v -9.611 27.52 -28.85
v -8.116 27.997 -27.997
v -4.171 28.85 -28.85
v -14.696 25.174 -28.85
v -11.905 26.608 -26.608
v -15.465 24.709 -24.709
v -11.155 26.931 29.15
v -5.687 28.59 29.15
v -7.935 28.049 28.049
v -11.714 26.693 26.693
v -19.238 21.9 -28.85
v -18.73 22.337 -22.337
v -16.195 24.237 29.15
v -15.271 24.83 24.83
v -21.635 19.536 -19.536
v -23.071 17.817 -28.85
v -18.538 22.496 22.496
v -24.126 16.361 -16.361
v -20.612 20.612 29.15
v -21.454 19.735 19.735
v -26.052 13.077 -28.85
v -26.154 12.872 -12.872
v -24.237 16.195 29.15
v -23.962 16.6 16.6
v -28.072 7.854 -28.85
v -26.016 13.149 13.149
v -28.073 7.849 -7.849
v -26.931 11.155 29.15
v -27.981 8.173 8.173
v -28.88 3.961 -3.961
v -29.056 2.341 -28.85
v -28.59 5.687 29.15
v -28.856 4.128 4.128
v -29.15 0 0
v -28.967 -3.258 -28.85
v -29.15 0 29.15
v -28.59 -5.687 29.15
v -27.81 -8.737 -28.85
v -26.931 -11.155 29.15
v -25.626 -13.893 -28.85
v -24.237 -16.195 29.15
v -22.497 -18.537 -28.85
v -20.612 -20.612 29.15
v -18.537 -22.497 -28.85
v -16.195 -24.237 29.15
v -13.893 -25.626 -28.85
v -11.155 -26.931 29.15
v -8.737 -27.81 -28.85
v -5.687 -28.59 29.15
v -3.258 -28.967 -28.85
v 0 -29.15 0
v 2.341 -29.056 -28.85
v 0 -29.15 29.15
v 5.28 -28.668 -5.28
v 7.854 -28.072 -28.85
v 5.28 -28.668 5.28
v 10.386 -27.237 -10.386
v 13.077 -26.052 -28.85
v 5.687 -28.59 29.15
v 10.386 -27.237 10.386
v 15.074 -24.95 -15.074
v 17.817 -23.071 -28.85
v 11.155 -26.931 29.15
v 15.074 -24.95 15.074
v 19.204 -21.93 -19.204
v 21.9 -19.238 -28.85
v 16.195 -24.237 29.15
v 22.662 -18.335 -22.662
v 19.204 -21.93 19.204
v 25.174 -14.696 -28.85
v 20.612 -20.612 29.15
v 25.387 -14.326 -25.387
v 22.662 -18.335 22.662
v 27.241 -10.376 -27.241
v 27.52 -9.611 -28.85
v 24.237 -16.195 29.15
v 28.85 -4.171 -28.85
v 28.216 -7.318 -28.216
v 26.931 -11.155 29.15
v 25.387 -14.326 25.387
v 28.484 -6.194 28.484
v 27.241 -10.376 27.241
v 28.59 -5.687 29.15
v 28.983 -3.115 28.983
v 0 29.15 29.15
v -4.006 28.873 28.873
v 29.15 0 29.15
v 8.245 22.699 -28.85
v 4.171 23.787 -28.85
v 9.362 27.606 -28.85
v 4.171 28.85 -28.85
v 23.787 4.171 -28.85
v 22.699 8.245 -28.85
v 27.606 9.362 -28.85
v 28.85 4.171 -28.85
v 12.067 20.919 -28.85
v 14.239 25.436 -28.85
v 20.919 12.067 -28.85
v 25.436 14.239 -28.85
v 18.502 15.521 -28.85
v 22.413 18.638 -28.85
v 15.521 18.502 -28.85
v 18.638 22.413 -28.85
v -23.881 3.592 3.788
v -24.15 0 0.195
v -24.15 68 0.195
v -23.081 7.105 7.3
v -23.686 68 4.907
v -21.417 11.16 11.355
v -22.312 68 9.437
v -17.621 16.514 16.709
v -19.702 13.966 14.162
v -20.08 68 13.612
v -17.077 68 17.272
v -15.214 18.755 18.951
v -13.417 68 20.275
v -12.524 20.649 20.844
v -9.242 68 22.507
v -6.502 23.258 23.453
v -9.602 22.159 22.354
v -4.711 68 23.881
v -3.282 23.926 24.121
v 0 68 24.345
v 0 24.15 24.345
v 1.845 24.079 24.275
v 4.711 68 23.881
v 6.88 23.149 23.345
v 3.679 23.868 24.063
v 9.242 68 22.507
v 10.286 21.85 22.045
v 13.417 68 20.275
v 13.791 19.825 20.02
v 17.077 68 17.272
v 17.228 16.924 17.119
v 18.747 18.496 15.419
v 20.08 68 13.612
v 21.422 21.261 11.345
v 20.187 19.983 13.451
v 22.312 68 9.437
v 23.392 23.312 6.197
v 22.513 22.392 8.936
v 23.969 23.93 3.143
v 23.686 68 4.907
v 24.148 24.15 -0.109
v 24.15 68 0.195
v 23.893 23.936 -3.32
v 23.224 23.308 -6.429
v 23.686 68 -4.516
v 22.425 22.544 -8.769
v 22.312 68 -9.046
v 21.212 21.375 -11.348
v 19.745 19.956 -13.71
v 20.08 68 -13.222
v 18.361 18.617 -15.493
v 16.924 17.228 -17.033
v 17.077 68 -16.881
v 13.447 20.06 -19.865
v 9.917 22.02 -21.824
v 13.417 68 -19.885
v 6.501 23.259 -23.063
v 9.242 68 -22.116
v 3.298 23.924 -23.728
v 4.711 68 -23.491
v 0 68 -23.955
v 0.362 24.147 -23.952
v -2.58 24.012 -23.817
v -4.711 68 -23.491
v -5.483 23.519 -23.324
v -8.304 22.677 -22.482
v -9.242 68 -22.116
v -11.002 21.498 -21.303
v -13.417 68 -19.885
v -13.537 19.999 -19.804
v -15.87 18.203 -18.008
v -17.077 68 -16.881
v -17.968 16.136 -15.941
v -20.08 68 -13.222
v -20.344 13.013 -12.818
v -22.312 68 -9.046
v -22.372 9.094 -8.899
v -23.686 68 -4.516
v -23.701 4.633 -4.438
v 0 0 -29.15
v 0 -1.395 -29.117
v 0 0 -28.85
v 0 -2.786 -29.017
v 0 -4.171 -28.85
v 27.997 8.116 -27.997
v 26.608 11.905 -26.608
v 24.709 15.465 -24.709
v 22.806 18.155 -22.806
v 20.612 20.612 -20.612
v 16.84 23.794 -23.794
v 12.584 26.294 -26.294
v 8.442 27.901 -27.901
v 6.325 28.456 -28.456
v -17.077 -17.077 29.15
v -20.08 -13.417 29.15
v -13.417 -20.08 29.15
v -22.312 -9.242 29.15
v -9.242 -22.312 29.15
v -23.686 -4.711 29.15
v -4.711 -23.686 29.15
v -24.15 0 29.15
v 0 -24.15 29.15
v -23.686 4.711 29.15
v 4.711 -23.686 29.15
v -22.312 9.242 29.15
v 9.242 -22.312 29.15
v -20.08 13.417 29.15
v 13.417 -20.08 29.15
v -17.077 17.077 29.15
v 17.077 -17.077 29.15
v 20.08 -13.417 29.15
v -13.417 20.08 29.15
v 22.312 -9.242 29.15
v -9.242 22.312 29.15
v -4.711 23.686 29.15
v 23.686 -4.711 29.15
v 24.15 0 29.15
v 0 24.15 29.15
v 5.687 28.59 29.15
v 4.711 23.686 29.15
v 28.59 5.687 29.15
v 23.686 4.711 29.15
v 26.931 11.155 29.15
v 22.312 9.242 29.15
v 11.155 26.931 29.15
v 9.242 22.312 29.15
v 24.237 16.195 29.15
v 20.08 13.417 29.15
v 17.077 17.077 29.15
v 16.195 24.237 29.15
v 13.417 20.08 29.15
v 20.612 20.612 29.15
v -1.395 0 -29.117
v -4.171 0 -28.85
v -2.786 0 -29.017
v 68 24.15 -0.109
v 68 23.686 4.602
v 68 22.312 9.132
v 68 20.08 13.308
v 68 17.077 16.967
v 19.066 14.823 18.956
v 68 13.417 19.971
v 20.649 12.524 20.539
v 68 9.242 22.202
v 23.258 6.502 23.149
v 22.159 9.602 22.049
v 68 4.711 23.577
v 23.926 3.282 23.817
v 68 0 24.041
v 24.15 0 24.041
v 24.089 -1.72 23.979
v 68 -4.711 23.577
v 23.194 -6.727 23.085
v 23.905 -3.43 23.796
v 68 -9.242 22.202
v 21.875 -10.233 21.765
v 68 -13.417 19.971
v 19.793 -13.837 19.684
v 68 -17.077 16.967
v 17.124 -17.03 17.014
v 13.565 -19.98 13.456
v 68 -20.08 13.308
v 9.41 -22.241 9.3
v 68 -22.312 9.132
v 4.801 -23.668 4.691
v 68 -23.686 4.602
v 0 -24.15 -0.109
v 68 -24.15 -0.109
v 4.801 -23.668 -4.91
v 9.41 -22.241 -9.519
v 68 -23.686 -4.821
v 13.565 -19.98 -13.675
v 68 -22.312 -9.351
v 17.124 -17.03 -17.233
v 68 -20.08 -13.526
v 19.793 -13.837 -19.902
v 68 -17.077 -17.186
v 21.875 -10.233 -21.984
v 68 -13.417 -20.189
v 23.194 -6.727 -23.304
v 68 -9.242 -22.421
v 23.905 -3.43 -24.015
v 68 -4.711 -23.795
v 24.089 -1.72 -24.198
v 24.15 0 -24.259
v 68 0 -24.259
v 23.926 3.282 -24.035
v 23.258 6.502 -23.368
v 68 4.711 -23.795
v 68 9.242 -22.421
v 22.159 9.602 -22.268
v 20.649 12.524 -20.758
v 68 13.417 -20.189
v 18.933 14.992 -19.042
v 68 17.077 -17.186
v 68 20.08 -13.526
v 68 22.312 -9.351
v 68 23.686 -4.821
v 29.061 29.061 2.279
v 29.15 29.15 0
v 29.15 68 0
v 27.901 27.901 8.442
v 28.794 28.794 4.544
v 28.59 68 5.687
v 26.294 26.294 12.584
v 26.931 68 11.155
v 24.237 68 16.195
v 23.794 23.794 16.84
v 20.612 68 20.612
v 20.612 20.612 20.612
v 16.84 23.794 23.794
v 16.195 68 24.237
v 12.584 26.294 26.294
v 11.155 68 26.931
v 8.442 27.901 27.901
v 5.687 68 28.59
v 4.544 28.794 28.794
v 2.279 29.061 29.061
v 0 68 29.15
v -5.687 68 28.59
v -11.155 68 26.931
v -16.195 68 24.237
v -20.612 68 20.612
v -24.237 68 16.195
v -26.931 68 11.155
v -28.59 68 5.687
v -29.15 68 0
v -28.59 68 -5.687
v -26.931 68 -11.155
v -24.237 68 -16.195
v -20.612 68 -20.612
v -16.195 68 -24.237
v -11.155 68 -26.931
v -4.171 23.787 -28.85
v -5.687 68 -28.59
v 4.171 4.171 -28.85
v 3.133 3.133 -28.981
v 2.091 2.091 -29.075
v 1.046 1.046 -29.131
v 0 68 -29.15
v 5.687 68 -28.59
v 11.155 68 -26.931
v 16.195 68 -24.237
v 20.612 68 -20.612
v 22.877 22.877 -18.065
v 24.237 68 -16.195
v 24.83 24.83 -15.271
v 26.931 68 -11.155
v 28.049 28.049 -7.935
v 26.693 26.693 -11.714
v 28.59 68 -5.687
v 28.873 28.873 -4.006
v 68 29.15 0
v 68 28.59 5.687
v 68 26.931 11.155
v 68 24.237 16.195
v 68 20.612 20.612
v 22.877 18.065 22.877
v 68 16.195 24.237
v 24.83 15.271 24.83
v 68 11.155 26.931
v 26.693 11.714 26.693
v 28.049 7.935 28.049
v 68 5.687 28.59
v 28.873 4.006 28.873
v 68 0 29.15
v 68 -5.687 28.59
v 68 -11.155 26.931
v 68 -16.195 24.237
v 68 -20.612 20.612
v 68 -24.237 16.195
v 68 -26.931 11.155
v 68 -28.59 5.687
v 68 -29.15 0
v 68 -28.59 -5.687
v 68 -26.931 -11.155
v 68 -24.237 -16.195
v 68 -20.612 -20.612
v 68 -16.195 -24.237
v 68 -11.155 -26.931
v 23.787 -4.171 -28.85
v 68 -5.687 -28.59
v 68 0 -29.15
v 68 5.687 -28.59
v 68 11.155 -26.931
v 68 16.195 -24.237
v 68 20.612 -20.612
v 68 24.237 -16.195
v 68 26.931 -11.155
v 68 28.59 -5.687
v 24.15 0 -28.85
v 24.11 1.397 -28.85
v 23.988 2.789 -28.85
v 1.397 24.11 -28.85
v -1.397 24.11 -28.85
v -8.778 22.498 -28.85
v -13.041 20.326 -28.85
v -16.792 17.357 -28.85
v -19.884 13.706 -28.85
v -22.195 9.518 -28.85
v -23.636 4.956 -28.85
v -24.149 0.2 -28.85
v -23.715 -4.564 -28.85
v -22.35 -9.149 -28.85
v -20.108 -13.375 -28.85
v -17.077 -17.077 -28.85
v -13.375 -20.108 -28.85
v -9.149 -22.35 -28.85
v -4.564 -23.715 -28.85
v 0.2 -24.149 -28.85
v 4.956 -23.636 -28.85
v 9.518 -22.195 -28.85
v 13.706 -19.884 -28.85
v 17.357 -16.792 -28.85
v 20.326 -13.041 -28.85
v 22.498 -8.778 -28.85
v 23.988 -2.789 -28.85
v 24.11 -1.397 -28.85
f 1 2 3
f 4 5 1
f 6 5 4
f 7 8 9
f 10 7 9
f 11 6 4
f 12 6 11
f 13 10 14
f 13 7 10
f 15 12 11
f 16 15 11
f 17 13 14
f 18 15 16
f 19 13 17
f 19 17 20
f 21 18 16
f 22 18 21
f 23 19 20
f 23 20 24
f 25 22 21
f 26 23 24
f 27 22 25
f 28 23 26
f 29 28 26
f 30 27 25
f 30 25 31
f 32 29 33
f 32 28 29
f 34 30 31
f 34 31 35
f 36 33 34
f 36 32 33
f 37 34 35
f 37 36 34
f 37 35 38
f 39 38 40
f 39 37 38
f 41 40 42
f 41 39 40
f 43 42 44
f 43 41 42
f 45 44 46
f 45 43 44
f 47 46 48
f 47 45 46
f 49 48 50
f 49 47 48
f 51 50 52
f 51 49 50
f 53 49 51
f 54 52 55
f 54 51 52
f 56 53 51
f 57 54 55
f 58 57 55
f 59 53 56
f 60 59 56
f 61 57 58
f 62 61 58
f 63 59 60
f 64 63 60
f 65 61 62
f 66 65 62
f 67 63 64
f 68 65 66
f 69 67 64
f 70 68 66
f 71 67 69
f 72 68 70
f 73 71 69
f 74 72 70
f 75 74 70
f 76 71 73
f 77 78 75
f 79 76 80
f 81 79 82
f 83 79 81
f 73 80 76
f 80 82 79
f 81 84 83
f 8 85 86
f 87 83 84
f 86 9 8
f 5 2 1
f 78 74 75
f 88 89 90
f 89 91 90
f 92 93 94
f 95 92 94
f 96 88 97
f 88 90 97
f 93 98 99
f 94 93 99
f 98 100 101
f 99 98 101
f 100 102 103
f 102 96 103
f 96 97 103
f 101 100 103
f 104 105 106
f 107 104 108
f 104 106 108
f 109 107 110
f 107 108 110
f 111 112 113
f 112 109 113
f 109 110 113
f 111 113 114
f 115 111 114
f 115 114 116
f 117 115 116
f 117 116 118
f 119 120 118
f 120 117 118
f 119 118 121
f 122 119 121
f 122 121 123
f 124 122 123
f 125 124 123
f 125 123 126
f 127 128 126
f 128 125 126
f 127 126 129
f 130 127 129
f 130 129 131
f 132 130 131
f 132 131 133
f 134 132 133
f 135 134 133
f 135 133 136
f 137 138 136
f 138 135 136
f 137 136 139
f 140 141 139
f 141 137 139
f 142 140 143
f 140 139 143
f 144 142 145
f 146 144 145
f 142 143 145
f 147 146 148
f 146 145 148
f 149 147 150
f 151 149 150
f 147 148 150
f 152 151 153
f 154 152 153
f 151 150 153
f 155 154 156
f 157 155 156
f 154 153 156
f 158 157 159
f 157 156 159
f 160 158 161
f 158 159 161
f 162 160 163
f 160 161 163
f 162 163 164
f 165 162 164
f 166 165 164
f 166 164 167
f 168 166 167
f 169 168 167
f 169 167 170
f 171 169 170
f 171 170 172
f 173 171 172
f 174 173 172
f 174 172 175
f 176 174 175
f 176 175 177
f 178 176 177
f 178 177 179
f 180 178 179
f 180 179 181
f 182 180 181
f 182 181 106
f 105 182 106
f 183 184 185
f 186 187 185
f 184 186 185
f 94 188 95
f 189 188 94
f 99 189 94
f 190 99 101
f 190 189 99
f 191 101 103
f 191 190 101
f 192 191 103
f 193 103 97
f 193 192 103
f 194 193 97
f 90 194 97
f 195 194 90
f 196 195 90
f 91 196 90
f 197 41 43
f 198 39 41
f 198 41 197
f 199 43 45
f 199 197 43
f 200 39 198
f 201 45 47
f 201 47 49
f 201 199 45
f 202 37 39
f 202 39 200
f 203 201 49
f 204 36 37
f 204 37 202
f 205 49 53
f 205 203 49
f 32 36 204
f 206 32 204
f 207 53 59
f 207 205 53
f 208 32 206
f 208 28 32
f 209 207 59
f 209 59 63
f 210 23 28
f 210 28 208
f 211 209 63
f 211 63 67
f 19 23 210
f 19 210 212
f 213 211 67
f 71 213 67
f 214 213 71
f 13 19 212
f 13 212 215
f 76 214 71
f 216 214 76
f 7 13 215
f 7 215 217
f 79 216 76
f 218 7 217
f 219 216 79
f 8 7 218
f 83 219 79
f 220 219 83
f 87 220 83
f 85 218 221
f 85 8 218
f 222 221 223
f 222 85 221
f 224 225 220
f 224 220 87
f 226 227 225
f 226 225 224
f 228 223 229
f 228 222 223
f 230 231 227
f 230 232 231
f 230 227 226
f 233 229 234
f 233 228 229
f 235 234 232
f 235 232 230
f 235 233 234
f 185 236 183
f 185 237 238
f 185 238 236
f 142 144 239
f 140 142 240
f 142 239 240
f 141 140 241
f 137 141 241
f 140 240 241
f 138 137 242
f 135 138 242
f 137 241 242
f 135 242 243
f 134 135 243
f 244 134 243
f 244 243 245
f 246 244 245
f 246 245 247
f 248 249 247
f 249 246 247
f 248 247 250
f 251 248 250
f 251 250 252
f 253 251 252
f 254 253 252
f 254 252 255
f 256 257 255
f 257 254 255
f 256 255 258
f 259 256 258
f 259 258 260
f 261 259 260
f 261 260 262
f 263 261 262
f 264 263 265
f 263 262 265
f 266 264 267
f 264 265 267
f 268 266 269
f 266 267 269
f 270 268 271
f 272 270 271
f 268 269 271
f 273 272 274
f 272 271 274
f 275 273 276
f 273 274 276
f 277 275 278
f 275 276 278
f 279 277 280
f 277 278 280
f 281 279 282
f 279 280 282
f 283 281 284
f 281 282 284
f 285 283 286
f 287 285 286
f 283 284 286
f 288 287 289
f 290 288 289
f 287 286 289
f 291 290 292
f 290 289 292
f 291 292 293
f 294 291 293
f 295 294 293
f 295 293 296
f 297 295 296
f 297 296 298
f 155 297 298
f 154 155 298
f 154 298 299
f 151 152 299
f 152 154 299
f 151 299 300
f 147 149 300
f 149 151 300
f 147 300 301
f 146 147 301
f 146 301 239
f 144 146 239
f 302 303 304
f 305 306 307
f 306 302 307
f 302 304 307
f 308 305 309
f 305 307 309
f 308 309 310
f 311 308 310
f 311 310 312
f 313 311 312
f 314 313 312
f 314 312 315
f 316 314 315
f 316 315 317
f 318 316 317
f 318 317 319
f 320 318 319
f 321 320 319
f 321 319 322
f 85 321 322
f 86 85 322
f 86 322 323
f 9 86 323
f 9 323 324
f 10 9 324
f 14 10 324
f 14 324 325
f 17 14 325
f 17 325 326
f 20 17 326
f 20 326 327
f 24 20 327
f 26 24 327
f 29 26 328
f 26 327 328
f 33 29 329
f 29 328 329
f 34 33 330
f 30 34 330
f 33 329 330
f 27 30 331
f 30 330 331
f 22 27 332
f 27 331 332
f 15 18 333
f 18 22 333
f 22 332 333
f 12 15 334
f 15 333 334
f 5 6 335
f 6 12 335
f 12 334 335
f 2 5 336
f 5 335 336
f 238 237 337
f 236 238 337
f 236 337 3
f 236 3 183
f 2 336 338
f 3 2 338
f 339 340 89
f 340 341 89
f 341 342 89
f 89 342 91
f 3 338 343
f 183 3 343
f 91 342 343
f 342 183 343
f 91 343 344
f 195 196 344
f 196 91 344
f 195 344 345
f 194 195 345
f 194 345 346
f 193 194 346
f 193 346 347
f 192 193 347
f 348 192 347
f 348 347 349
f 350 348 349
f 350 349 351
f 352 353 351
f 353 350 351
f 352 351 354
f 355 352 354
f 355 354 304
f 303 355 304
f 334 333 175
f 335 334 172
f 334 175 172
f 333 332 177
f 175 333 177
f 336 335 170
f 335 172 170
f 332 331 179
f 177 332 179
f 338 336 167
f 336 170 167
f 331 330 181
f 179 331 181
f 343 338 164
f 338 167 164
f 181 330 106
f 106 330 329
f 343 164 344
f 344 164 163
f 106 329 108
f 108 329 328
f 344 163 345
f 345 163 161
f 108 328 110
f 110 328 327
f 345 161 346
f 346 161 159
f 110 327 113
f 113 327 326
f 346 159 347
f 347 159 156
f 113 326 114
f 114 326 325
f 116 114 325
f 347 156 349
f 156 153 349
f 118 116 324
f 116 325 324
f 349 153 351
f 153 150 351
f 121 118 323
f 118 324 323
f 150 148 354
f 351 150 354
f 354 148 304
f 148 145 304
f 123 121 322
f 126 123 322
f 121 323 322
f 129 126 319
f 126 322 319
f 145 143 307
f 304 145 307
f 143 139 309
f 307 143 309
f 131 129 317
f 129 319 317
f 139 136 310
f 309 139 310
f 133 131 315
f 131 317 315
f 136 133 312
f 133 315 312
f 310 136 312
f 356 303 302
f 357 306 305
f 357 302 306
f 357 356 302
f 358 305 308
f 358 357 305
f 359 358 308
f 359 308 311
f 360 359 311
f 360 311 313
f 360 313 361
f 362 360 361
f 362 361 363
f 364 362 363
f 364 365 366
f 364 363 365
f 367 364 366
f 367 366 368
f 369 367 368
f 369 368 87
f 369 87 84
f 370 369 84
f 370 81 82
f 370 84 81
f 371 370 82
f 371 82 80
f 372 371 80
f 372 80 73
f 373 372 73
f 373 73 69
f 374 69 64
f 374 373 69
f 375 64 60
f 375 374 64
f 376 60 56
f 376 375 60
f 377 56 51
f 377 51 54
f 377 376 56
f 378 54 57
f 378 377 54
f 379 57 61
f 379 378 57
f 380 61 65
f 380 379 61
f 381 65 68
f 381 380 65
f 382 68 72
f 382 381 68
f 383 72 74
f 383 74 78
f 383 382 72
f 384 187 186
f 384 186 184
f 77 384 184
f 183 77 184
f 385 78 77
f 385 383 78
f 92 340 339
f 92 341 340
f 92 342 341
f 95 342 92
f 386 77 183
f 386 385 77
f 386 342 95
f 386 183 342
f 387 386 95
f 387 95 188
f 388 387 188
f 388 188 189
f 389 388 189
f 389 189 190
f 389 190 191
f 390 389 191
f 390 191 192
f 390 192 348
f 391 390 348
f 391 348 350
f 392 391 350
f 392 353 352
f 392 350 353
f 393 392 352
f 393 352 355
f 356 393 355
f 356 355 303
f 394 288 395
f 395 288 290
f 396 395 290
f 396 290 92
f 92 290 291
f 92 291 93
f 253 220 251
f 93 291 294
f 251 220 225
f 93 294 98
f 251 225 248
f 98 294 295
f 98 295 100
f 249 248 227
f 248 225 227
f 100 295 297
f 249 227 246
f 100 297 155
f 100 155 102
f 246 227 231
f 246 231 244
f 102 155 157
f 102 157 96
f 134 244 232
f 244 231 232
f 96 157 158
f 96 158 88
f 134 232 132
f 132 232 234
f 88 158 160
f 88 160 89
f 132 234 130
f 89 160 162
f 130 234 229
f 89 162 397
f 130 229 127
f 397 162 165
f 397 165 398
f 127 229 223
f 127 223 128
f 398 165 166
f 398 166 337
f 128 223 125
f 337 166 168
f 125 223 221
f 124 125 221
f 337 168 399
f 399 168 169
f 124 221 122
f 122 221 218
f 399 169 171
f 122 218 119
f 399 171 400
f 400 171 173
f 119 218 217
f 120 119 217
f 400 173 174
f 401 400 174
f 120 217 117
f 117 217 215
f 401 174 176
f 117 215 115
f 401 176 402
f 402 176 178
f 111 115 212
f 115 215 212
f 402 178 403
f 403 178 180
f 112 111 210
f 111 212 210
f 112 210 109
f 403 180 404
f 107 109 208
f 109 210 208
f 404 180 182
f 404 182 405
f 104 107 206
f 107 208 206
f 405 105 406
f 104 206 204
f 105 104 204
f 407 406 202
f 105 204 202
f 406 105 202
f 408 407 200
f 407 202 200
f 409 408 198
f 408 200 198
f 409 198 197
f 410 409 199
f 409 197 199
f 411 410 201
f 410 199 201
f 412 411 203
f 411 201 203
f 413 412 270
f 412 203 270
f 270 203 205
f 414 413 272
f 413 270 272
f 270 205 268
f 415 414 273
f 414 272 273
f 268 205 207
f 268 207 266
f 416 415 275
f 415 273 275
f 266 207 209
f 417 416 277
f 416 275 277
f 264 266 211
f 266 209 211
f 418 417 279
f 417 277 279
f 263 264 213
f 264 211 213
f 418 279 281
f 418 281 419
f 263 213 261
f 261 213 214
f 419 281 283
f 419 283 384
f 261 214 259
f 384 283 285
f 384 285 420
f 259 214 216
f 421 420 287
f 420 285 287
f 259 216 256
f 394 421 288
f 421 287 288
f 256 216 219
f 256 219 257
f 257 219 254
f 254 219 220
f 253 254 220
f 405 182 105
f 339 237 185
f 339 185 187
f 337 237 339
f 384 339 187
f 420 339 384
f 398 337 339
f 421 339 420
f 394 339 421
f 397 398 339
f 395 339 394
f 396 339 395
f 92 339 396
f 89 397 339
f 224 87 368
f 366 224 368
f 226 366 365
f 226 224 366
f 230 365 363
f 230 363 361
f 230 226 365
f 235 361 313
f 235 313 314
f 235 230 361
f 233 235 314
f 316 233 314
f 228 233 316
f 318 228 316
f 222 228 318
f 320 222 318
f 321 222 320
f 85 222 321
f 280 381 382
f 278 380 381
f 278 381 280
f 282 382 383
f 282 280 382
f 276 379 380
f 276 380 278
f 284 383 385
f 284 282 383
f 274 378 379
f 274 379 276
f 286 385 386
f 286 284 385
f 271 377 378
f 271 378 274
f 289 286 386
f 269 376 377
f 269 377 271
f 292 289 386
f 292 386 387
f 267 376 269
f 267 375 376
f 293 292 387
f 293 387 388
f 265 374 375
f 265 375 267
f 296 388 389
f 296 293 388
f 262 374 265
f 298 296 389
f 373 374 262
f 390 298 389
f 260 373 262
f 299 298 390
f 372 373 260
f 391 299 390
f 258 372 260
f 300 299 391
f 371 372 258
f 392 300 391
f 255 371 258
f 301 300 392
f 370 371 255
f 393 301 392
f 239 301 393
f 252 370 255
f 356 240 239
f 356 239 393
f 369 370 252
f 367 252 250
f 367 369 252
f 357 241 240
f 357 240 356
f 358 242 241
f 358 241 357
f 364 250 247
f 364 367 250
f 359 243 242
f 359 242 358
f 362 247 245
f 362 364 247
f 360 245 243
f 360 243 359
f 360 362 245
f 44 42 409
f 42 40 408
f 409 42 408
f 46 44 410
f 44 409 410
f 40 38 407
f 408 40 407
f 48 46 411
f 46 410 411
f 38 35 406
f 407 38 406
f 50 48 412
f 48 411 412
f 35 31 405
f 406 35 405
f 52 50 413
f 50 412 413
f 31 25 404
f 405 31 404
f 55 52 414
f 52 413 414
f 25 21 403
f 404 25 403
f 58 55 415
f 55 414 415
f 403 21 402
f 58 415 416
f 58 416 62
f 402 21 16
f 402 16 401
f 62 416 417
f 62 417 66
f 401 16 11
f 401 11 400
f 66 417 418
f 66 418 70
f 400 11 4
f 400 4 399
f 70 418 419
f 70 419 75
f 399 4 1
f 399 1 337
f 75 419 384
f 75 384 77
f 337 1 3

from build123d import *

# Parameters (mm, degrees)
SKETCH_R        = 29.15
PAD_DEPTH       = 58
SKETCH001_R     = 29.15
PAD001_DEPTH    = 68
SKETCH002_R     = 29.15
PAD002_DEPTH    = 68
SKETCH003_R     = 24.15
POCKET_DEPTH    = 58
SKETCH004_R     = 24.15
POCKET001_DEPTH = 68
SKETCH005_R     = 24.15
POCKET002_DEPTH = 68


with BuildPart() as part:
    # Sketch → Pad (new body)
    with BuildSketch(Plane.XY.offset(29.15)):
        Circle(SKETCH_R)
    extrude(amount=-PAD_DEPTH)

    # Sketch001 → Pad001 (join)
    with BuildSketch(Plane.XZ.offset(-68)):
        Circle(SKETCH001_R)
    extrude(amount=PAD001_DEPTH)

    # Sketch002 → Pad002 (join)
    with BuildSketch(Plane.YZ.offset(68)):
        Circle(SKETCH002_R)
    extrude(amount=-PAD002_DEPTH)

    # Sketch003 (on Face5 of Pad002) → Pocket (cut)
    with BuildSketch(Plane.XY.offset(29.15)):
        Circle(SKETCH003_R)
    extrude(amount=-POCKET_DEPTH, mode=Mode.SUBTRACT)

    # Sketch004 (on Face15 of Pocket) → Pocket001 (cut)
    with BuildSketch(Plane(origin=(68, 0, 29.15), x_dir=(0, 1, 0), z_dir=(1, 0, 0))):
        with Locations((0, -29.259423)):
            Circle(SKETCH004_R)
    extrude(amount=-POCKET001_DEPTH, mode=Mode.SUBTRACT)

    # Sketch005 (on Face7 of Pocket001) → Pocket002 (cut)
    with BuildSketch(Plane(origin=(0, 68, 29.15), x_dir=(-1, 0, 0), z_dir=(0, 1, 0))):
        with Locations((0, -28.95468)):
            Circle(SKETCH005_R)
    extrude(amount=-POCKET002_DEPTH, mode=Mode.SUBTRACT)


solid = part.part
